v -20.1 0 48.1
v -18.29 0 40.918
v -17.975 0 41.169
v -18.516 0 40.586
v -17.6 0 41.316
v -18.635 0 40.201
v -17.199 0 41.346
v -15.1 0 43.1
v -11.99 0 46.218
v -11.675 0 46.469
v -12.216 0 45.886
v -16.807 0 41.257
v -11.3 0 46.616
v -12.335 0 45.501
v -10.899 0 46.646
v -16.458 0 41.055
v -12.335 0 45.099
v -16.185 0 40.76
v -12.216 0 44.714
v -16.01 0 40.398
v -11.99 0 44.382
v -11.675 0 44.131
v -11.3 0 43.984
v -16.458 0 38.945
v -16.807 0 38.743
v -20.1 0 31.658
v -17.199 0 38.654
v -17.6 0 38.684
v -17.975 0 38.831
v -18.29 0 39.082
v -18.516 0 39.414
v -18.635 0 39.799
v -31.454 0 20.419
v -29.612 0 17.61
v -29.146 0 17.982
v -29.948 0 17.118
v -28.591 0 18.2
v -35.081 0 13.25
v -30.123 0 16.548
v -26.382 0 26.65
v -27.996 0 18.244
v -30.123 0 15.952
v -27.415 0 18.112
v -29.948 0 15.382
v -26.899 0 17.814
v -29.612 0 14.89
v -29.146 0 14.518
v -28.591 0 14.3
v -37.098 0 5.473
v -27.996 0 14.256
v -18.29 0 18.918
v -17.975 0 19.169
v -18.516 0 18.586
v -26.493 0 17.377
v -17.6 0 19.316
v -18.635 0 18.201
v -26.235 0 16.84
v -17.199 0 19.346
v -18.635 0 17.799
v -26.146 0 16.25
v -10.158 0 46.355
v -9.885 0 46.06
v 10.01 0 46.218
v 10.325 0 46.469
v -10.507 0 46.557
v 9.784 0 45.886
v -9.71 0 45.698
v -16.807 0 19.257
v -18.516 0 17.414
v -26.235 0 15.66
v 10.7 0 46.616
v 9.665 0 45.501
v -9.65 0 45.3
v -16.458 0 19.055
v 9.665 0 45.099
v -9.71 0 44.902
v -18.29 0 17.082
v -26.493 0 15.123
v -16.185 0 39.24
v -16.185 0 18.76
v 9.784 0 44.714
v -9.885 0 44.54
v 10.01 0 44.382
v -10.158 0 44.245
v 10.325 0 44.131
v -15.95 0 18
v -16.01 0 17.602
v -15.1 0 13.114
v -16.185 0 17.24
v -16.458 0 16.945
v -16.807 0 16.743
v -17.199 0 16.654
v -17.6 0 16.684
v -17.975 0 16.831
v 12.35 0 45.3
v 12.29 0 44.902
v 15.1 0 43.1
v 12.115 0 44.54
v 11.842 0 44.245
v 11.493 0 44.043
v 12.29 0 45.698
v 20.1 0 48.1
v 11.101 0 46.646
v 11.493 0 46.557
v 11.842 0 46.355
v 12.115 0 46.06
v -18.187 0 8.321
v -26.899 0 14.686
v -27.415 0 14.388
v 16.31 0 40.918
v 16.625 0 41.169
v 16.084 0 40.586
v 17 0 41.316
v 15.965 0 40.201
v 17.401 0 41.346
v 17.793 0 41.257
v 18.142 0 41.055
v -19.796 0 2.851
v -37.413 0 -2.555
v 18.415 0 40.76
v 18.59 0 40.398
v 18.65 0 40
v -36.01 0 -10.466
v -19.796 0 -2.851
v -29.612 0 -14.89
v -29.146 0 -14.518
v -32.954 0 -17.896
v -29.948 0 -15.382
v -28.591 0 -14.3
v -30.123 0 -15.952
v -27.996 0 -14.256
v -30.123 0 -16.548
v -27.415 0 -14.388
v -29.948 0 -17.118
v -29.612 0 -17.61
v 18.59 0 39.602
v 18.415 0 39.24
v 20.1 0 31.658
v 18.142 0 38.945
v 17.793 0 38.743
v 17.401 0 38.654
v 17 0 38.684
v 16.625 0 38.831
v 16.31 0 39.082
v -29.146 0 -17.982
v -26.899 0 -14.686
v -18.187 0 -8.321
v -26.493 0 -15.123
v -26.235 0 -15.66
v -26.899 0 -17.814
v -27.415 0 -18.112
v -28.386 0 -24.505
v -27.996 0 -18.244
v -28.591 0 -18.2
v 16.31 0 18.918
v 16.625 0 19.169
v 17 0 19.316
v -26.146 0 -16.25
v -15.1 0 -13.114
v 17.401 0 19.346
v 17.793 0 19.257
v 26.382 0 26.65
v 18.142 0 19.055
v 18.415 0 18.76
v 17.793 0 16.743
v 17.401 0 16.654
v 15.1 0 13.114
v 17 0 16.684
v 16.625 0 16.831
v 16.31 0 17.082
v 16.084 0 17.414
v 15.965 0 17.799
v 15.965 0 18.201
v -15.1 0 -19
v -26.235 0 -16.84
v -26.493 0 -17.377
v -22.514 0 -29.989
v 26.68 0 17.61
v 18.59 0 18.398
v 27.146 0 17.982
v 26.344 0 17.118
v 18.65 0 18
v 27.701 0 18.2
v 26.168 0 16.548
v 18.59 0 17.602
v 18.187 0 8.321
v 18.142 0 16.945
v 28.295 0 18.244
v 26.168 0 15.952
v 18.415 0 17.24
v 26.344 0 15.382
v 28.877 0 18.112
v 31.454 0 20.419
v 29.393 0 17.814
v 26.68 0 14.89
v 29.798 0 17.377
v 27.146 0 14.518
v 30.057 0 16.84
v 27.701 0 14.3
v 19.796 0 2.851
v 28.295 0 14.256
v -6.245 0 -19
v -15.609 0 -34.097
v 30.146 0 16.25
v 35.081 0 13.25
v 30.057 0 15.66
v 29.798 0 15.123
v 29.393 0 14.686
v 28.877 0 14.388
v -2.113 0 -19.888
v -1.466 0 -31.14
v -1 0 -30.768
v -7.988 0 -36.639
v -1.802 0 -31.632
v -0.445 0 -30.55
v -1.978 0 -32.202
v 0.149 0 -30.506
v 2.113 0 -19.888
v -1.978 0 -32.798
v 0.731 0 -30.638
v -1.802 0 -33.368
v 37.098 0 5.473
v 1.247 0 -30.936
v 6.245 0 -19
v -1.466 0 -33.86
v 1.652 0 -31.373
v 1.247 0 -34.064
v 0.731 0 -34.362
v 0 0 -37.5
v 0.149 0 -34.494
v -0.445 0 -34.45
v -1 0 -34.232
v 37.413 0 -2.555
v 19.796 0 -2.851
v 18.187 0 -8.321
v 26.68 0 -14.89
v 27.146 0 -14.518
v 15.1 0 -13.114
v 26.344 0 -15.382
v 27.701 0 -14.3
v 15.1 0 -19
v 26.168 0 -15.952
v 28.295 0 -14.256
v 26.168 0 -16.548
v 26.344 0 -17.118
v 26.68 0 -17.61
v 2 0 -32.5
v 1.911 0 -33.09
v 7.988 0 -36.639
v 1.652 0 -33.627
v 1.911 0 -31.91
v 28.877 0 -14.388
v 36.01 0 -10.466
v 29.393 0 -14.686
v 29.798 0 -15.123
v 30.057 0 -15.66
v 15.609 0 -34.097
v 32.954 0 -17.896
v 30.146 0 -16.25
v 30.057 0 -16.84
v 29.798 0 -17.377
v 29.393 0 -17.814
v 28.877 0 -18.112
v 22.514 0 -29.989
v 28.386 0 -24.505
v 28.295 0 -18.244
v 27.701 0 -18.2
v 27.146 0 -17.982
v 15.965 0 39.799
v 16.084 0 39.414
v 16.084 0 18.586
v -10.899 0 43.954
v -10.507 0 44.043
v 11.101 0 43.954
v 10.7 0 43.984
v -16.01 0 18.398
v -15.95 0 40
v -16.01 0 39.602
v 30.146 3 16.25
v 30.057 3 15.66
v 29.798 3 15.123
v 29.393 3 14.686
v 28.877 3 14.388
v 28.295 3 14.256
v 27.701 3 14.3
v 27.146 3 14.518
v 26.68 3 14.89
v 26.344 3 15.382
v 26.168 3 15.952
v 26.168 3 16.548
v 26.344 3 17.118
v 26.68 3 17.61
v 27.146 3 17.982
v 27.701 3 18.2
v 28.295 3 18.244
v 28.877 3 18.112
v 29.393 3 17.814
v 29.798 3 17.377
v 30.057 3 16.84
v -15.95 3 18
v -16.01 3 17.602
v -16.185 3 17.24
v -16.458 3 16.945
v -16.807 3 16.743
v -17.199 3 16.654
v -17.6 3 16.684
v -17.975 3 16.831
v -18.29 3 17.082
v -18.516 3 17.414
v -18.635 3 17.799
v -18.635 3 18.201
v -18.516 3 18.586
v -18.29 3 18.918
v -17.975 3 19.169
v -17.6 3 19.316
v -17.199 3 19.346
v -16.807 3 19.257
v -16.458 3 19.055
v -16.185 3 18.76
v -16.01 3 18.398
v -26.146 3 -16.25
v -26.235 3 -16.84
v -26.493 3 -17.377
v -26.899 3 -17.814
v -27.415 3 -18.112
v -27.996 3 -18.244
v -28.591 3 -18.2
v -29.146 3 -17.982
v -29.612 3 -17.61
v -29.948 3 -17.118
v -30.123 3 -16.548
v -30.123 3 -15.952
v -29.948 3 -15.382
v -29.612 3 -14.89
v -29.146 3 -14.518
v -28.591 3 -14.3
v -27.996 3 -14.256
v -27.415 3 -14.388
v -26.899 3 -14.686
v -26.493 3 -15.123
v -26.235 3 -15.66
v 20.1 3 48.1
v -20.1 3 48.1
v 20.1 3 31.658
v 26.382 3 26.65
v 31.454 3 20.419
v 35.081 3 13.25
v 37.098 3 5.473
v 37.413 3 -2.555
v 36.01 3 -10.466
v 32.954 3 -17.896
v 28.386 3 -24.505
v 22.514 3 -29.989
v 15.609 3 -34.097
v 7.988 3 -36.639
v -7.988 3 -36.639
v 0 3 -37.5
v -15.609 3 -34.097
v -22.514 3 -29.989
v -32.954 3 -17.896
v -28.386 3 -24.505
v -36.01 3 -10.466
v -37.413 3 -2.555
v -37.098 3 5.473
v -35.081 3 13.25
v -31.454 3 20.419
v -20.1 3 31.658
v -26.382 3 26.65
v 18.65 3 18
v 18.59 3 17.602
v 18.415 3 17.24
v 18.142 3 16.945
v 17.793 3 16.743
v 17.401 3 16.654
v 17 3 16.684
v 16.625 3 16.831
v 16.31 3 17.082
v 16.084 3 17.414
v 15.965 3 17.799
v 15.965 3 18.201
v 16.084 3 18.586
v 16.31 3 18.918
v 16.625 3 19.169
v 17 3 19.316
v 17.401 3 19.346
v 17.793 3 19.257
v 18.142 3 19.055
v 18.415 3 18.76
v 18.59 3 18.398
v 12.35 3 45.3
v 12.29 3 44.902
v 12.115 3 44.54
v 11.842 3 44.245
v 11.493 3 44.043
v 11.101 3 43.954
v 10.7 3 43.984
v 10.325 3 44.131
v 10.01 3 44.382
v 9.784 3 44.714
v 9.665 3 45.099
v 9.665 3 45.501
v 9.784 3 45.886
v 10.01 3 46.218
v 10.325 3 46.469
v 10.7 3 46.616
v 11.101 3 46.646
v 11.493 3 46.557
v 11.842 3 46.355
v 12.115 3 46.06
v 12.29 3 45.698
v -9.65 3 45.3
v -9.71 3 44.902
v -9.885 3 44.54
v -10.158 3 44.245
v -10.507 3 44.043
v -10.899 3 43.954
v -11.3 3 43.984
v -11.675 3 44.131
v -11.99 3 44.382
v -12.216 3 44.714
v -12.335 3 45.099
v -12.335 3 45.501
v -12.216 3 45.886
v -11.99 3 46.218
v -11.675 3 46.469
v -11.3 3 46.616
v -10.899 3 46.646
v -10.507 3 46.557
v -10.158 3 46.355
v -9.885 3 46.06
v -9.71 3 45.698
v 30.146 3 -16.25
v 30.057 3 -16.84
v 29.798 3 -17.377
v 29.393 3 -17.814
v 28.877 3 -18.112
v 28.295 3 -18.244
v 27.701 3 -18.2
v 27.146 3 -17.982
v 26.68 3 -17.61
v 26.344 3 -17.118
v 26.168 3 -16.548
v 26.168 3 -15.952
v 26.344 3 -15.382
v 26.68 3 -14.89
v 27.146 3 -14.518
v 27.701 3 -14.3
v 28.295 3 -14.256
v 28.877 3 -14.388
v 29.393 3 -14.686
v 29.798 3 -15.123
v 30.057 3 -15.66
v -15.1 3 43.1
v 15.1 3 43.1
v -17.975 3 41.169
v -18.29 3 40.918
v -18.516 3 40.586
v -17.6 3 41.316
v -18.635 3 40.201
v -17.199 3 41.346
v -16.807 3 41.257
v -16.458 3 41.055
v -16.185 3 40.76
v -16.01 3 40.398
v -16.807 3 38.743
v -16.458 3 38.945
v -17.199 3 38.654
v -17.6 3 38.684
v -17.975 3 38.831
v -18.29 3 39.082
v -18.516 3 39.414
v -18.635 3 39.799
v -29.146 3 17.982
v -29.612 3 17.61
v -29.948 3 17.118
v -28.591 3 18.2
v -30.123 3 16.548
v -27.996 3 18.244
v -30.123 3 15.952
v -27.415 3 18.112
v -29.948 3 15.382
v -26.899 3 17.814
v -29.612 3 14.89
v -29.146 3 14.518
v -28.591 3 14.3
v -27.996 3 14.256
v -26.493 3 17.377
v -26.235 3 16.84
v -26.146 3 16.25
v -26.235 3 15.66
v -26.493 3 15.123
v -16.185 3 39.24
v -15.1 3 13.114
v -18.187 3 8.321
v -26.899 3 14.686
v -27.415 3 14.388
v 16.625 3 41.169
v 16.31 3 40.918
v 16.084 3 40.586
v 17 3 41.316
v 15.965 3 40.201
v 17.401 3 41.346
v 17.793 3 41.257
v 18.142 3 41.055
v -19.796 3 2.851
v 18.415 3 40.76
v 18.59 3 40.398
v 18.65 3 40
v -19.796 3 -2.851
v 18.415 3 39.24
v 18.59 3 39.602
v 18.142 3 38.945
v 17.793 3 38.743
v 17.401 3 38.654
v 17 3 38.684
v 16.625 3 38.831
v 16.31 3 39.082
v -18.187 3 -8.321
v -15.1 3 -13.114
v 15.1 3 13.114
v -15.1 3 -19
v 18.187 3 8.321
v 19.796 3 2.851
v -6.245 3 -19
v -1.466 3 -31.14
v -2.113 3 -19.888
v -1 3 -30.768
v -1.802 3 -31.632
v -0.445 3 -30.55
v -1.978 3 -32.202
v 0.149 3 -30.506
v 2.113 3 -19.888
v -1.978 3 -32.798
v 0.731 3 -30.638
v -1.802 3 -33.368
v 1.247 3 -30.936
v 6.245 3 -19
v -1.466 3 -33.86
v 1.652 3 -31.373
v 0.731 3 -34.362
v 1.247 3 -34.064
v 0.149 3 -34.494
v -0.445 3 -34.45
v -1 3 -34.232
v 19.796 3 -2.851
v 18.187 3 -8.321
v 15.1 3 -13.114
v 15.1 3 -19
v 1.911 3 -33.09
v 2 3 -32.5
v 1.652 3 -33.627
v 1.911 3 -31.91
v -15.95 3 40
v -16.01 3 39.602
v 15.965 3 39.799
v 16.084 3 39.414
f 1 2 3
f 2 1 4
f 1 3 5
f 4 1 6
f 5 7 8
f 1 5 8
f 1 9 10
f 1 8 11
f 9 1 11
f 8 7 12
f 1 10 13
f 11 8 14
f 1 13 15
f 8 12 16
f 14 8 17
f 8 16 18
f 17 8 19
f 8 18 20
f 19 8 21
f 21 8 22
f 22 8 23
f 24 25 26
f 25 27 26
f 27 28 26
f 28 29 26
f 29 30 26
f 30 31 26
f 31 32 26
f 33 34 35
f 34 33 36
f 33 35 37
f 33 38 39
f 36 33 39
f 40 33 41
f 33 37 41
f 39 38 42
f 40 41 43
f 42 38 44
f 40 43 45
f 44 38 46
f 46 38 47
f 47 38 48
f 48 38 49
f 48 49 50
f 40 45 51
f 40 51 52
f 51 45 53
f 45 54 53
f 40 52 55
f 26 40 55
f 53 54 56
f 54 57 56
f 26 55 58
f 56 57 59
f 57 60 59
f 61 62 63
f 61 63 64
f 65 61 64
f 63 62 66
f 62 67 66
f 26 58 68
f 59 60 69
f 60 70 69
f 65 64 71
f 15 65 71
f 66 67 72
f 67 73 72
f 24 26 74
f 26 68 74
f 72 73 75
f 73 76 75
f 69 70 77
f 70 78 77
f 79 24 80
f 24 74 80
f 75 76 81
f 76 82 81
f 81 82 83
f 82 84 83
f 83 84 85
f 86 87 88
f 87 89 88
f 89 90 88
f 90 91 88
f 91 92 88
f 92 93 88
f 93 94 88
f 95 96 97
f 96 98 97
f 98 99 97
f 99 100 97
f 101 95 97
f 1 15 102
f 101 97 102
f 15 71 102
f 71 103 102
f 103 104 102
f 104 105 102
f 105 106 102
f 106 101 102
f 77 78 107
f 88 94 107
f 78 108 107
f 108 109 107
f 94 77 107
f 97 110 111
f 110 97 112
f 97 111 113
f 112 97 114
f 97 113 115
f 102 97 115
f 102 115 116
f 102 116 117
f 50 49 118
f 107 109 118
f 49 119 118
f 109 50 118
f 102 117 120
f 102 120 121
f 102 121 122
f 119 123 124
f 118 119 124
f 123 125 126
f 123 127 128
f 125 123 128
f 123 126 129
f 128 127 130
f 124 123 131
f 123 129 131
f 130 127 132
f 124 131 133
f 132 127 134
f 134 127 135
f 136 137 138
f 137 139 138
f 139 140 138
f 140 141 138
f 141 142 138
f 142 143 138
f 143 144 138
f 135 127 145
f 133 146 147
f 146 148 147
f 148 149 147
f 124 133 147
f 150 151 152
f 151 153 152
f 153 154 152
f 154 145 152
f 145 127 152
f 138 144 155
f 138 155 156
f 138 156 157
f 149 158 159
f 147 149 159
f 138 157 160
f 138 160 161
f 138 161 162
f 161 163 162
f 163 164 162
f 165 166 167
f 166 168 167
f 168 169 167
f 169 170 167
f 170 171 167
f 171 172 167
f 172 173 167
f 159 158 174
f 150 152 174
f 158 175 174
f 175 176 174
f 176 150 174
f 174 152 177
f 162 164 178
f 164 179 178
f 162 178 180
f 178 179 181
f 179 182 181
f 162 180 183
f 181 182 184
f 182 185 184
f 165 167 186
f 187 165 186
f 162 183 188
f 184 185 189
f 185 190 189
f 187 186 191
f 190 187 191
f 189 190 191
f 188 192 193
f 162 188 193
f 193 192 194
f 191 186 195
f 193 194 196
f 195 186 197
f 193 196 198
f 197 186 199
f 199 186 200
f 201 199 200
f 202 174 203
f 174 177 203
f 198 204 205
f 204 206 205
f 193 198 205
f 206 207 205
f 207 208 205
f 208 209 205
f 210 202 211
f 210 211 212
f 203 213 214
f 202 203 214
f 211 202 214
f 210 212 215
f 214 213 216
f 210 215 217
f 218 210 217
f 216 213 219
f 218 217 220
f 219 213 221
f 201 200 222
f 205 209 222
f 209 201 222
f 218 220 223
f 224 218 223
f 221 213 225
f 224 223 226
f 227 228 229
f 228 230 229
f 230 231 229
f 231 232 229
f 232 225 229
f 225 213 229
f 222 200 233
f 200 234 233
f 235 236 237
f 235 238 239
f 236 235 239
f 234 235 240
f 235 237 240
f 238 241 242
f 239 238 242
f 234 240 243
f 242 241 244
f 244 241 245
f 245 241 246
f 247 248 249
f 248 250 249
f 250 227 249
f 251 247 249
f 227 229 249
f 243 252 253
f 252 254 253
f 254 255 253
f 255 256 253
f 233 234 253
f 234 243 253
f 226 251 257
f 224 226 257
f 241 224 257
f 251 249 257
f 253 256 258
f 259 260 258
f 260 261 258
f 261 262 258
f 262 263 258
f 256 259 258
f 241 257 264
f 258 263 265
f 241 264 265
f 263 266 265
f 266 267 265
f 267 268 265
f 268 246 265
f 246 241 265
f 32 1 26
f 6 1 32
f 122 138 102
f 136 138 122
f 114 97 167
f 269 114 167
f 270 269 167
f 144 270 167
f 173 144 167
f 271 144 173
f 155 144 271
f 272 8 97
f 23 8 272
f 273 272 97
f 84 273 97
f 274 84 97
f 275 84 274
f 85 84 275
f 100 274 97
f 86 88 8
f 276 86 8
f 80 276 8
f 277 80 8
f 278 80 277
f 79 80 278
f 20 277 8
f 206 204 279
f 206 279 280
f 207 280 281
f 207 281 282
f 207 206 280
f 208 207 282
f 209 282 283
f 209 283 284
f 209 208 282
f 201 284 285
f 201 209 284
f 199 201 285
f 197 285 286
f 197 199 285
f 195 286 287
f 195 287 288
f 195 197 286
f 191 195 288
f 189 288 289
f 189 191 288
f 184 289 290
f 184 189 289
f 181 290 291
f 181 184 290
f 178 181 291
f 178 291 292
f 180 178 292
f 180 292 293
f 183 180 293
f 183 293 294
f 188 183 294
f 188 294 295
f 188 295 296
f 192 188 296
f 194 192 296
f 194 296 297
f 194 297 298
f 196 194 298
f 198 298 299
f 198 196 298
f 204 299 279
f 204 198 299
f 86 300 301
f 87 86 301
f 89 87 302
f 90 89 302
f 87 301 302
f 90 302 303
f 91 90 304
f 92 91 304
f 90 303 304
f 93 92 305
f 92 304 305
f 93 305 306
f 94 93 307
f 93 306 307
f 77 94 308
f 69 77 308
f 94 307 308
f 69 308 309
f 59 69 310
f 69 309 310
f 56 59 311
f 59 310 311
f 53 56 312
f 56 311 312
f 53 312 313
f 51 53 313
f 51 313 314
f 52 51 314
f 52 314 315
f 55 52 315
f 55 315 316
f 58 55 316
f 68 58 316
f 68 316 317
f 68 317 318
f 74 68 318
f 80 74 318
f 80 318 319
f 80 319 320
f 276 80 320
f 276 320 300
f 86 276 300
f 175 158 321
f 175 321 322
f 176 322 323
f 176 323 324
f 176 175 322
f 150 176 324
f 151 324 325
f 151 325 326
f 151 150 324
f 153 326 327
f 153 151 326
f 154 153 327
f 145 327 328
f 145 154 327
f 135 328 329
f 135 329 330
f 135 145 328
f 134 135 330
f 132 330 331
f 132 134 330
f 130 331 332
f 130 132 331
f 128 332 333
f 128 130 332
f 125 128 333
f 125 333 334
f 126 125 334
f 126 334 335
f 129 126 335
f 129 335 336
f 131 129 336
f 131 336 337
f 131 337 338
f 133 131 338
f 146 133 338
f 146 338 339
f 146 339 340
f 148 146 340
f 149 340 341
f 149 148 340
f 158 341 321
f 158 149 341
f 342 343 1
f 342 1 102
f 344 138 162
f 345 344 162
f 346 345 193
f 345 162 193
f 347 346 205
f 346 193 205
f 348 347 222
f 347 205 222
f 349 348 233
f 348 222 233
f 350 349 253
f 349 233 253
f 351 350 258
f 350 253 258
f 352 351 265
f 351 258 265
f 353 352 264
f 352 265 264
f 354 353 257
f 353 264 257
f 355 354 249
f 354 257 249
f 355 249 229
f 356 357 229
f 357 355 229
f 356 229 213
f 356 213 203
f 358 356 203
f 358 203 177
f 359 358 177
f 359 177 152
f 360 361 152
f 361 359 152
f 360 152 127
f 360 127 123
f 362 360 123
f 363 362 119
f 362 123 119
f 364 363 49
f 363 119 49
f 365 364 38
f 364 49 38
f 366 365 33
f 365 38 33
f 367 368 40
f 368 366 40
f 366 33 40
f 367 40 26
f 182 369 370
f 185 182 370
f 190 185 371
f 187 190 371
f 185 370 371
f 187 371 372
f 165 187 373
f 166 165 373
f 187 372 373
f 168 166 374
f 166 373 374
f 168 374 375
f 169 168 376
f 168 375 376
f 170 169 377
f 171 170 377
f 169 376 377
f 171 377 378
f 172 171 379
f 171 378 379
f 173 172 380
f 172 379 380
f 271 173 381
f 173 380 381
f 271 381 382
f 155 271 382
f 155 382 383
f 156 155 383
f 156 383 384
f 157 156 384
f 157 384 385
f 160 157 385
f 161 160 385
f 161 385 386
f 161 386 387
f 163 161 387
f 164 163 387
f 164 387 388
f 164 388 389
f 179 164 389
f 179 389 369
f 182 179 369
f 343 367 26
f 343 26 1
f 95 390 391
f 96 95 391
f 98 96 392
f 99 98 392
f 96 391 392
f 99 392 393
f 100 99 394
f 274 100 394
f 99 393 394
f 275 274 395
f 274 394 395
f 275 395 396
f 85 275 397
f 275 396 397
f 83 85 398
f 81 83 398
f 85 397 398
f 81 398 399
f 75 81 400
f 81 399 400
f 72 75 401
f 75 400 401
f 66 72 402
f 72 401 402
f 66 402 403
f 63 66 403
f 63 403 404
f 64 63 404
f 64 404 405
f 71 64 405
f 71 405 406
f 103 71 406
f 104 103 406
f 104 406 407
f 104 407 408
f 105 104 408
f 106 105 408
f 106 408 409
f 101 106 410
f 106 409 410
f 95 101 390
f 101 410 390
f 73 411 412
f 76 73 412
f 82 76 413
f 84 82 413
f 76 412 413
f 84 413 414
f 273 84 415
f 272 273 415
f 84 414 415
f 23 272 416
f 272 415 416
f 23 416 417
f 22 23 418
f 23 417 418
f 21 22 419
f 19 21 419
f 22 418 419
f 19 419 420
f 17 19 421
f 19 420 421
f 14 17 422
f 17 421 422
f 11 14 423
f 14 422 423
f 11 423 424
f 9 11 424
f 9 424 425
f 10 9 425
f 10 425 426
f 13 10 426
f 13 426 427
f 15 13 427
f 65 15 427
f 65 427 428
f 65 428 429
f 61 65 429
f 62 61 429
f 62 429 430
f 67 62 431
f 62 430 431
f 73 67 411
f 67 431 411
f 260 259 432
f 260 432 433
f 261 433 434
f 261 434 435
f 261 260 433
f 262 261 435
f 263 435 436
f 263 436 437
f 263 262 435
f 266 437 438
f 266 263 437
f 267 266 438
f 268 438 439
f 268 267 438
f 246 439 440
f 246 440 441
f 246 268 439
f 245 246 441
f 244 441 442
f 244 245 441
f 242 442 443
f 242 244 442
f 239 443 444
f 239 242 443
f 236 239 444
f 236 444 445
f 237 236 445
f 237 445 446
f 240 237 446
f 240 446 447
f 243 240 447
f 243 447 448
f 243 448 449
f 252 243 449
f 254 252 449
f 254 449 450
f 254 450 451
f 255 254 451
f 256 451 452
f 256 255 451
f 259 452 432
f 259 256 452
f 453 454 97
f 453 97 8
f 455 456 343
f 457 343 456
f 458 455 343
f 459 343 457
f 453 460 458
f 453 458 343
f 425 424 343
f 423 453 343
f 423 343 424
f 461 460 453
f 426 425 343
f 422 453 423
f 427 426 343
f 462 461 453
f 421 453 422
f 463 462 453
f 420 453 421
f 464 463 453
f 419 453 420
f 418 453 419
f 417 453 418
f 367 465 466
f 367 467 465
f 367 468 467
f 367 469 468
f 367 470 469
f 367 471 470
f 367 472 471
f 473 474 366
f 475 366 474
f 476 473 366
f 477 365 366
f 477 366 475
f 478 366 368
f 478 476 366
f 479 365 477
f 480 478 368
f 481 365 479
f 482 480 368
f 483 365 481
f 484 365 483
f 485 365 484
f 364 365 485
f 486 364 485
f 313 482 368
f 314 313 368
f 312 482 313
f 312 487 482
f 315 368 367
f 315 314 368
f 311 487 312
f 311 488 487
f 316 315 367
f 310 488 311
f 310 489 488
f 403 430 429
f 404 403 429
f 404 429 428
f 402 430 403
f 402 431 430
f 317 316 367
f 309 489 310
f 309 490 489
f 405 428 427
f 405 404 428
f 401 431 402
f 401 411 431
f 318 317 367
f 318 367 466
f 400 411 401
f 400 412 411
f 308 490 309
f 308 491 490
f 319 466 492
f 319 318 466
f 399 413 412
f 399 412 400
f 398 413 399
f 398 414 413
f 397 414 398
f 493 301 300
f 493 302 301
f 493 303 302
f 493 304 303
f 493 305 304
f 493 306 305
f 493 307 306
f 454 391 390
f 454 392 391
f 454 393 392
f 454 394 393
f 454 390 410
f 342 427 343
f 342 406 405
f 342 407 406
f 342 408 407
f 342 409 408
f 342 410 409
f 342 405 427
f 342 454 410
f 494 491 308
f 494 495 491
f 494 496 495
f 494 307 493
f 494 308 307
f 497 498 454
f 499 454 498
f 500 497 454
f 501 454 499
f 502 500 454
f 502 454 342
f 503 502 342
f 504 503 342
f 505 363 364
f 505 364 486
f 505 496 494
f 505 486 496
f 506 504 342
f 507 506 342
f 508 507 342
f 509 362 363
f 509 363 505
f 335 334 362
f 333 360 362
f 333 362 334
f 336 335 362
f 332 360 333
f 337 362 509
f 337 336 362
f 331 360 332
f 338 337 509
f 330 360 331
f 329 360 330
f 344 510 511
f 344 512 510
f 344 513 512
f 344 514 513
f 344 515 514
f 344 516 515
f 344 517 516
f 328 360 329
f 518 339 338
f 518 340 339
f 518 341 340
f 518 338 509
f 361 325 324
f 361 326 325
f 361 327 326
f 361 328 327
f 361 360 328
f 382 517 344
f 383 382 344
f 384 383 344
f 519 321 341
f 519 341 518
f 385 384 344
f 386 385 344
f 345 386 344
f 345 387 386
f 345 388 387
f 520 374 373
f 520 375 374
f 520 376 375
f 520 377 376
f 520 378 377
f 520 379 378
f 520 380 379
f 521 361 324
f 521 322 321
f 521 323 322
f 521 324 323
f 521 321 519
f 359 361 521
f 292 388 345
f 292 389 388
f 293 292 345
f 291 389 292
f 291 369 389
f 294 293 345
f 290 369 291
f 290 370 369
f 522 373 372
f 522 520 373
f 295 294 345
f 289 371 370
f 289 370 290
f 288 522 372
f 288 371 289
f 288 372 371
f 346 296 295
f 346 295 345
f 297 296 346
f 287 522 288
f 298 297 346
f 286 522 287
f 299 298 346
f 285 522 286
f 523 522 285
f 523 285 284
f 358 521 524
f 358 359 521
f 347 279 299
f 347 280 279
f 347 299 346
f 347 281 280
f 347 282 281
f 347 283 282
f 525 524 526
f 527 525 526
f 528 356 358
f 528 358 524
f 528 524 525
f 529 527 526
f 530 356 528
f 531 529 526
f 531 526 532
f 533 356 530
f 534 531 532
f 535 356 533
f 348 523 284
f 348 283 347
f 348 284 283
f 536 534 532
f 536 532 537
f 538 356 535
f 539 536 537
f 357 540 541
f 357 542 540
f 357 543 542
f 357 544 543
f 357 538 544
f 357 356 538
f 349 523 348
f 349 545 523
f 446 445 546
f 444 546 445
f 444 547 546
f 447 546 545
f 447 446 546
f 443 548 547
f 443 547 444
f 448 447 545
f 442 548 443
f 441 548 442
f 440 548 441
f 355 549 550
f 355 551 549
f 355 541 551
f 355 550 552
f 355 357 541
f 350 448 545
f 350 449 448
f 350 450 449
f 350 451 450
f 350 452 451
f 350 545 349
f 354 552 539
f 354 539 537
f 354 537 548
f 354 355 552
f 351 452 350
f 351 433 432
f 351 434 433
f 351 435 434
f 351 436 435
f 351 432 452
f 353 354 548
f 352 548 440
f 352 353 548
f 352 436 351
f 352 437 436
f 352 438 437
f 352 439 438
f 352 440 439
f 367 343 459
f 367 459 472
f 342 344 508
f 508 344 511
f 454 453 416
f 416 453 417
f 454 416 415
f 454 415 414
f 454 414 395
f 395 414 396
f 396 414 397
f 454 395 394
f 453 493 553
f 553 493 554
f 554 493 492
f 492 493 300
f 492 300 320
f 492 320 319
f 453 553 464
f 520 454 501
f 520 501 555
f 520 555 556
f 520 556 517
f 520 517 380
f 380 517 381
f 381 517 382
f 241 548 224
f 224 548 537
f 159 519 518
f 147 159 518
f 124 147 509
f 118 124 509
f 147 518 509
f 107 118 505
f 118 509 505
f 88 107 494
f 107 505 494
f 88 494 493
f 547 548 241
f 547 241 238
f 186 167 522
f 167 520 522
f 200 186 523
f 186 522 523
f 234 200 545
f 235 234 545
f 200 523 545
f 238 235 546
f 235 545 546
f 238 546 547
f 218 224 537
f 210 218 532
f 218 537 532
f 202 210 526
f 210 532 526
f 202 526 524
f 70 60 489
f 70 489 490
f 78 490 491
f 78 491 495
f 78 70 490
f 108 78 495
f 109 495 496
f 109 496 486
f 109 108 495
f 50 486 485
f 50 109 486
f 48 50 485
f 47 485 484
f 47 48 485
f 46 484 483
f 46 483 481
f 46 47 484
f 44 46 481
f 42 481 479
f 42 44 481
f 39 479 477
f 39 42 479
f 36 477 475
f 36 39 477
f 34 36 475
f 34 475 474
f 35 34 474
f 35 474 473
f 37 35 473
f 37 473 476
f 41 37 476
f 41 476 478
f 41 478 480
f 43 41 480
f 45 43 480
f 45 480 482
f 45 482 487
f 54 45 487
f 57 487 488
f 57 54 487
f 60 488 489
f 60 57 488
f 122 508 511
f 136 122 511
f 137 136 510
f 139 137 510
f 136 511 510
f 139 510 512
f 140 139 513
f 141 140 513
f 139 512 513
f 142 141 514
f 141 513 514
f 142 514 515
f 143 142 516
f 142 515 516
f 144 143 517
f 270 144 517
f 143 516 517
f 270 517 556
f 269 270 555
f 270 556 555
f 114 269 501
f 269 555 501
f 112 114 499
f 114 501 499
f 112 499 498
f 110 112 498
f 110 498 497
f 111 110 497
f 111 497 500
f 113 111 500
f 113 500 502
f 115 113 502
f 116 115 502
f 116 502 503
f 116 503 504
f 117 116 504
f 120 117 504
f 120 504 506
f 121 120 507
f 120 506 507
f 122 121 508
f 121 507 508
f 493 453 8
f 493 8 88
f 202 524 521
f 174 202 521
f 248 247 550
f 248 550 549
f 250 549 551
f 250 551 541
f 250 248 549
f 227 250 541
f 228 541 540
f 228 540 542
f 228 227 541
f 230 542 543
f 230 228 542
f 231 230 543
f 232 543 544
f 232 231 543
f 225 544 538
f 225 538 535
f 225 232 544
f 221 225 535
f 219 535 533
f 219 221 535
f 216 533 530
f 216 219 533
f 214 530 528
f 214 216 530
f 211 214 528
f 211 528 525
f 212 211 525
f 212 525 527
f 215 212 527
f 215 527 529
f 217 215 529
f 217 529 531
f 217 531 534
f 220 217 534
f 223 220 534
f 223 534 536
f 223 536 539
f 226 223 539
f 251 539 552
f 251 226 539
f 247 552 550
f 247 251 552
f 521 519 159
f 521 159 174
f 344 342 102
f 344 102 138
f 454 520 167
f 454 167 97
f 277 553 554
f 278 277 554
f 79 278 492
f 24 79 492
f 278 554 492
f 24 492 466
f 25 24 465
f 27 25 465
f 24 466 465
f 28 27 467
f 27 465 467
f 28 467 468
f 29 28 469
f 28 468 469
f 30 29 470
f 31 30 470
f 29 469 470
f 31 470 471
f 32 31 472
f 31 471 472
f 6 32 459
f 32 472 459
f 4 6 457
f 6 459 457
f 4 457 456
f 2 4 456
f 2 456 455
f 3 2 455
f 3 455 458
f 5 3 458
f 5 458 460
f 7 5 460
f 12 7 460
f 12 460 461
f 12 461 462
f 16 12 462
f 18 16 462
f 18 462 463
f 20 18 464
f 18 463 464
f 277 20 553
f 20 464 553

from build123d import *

# Parameters (mm, degrees)
SKETCH1_R           = 37.5
SKETCH1_R_2         = 2
BOSS_EXTRUDE1_DEPTH = 3
SKETCH2_R           = 1.35
BOSS_EXTRUDE2_DEPTH = 3
SKETCH2_3_R         = 2
SKETCH2_3_R_2       = 1.35
CUT_EXTRUDE1_DEPTH  = 4
SKETCH3_R           = 20
CUT_EXTRUDE2_DEPTH  = 4


with BuildPart() as part:
    # Sketch1 → Boss-Extrude1 (new body)
    with BuildSketch(Plane(origin=(0, 0, 0), x_dir=(1, 0, 0), z_dir=(0, 1, 0))):
        Circle(SKETCH1_R)
        with Locations((0, 32.5)):
            Circle(SKETCH1_R_2, mode=Mode.SUBTRACT)
        with Locations((28.145825623, 16.25)):
            Circle(SKETCH1_R_2, mode=Mode.SUBTRACT)
        with Locations((28.145825623, -16.25)):
            Circle(SKETCH1_R_2, mode=Mode.SUBTRACT)
        with Locations((0, -32.5)):
            Circle(SKETCH1_R_2, mode=Mode.SUBTRACT)
        with Locations((-28.145825623, -16.25)):
            Circle(SKETCH1_R_2, mode=Mode.SUBTRACT)
        with Locations((-28.145825623, 16.25)):
            Circle(SKETCH1_R_2, mode=Mode.SUBTRACT)
    extrude(amount=BOSS_EXTRUDE1_DEPTH)

    # Sketch2 → Boss-Extrude2 (add, through all)
    with BuildSketch(Plane(origin=(0, 3, 0), x_dir=(1, 0, 0), z_dir=(0, 1, 0))):
        with BuildLine():
            ThreePointArc((-15.1, -34.325500725), (-17.650457715, -33.086422328), (-20.1, -31.6581743))
            Line((-20.1, -31.6581743), (-20.1, -48.1))
            Line((-20.1, -48.1), (20.1, -48.1))
            Line((20.1, -48.1), (20.1, -31.6581743))
            ThreePointArc((20.1, -31.6581743), (17.650457715, -33.086422328), (15.1, -34.325500725))
            Line((15.1, -34.325500725), (15.1, -43.1))
            Line((15.1, -43.1), (-15.1, -43.1))
            Line((-15.1, -43.1), (-15.1, -34.325500725))
        make_face()
        with Locations((-11, -45.3)):
            Circle(SKETCH2_R, mode=Mode.SUBTRACT)
        with Locations((-17.3, -40)):
            Circle(SKETCH2_R, mode=Mode.SUBTRACT)
        with Locations((11, -45.3)):
            Circle(SKETCH2_R, mode=Mode.SUBTRACT)
        with Locations((17.3, -40)):
            Circle(SKETCH2_R, mode=Mode.SUBTRACT)
    extrude(amount=-BOSS_EXTRUDE2_DEPTH)

    # Sketch2<3> → Cut-Extrude1 (cut, through all)
    with BuildSketch(Plane(origin=(0, 3, 0), x_dir=(1, 0, 0), z_dir=(0, 1, 0))):
        with BuildLine():
            Line((15.1, 19), (-15.1, 19))
            Line((-15.1, 19), (-15.1, -34.325500725))
            ThreePointArc((-15.1, -34.325500725), (0, -37.5), (15.1, -34.325500725))
            Line((15.1, -34.325500725), (15.1, 19))
        make_face()
        with Locations((0, -32.5)):
            Circle(SKETCH2_3_R, mode=Mode.SUBTRACT)
        with Locations((-17.3, 4)):
            Circle(SKETCH2_3_R_2)
        with Locations((-17.3, -18)):
            Circle(SKETCH2_3_R_2)
        with Locations((17.3, -18)):
            Circle(SKETCH2_3_R_2)
        with Locations((17.3, 4)):
            Circle(SKETCH2_3_R_2)
    extrude(amount=-CUT_EXTRUDE1_DEPTH, mode=Mode.SUBTRACT)

    # Sketch3 → Cut-Extrude2 (cut, through all)
    with BuildSketch(Plane(origin=(0, 3, 0), x_dir=(1, 0, 0), z_dir=(0, 1, 0))):
        Circle(SKETCH3_R)
    extrude(amount=-CUT_EXTRUDE2_DEPTH, mode=Mode.SUBTRACT)


solid = part.part
